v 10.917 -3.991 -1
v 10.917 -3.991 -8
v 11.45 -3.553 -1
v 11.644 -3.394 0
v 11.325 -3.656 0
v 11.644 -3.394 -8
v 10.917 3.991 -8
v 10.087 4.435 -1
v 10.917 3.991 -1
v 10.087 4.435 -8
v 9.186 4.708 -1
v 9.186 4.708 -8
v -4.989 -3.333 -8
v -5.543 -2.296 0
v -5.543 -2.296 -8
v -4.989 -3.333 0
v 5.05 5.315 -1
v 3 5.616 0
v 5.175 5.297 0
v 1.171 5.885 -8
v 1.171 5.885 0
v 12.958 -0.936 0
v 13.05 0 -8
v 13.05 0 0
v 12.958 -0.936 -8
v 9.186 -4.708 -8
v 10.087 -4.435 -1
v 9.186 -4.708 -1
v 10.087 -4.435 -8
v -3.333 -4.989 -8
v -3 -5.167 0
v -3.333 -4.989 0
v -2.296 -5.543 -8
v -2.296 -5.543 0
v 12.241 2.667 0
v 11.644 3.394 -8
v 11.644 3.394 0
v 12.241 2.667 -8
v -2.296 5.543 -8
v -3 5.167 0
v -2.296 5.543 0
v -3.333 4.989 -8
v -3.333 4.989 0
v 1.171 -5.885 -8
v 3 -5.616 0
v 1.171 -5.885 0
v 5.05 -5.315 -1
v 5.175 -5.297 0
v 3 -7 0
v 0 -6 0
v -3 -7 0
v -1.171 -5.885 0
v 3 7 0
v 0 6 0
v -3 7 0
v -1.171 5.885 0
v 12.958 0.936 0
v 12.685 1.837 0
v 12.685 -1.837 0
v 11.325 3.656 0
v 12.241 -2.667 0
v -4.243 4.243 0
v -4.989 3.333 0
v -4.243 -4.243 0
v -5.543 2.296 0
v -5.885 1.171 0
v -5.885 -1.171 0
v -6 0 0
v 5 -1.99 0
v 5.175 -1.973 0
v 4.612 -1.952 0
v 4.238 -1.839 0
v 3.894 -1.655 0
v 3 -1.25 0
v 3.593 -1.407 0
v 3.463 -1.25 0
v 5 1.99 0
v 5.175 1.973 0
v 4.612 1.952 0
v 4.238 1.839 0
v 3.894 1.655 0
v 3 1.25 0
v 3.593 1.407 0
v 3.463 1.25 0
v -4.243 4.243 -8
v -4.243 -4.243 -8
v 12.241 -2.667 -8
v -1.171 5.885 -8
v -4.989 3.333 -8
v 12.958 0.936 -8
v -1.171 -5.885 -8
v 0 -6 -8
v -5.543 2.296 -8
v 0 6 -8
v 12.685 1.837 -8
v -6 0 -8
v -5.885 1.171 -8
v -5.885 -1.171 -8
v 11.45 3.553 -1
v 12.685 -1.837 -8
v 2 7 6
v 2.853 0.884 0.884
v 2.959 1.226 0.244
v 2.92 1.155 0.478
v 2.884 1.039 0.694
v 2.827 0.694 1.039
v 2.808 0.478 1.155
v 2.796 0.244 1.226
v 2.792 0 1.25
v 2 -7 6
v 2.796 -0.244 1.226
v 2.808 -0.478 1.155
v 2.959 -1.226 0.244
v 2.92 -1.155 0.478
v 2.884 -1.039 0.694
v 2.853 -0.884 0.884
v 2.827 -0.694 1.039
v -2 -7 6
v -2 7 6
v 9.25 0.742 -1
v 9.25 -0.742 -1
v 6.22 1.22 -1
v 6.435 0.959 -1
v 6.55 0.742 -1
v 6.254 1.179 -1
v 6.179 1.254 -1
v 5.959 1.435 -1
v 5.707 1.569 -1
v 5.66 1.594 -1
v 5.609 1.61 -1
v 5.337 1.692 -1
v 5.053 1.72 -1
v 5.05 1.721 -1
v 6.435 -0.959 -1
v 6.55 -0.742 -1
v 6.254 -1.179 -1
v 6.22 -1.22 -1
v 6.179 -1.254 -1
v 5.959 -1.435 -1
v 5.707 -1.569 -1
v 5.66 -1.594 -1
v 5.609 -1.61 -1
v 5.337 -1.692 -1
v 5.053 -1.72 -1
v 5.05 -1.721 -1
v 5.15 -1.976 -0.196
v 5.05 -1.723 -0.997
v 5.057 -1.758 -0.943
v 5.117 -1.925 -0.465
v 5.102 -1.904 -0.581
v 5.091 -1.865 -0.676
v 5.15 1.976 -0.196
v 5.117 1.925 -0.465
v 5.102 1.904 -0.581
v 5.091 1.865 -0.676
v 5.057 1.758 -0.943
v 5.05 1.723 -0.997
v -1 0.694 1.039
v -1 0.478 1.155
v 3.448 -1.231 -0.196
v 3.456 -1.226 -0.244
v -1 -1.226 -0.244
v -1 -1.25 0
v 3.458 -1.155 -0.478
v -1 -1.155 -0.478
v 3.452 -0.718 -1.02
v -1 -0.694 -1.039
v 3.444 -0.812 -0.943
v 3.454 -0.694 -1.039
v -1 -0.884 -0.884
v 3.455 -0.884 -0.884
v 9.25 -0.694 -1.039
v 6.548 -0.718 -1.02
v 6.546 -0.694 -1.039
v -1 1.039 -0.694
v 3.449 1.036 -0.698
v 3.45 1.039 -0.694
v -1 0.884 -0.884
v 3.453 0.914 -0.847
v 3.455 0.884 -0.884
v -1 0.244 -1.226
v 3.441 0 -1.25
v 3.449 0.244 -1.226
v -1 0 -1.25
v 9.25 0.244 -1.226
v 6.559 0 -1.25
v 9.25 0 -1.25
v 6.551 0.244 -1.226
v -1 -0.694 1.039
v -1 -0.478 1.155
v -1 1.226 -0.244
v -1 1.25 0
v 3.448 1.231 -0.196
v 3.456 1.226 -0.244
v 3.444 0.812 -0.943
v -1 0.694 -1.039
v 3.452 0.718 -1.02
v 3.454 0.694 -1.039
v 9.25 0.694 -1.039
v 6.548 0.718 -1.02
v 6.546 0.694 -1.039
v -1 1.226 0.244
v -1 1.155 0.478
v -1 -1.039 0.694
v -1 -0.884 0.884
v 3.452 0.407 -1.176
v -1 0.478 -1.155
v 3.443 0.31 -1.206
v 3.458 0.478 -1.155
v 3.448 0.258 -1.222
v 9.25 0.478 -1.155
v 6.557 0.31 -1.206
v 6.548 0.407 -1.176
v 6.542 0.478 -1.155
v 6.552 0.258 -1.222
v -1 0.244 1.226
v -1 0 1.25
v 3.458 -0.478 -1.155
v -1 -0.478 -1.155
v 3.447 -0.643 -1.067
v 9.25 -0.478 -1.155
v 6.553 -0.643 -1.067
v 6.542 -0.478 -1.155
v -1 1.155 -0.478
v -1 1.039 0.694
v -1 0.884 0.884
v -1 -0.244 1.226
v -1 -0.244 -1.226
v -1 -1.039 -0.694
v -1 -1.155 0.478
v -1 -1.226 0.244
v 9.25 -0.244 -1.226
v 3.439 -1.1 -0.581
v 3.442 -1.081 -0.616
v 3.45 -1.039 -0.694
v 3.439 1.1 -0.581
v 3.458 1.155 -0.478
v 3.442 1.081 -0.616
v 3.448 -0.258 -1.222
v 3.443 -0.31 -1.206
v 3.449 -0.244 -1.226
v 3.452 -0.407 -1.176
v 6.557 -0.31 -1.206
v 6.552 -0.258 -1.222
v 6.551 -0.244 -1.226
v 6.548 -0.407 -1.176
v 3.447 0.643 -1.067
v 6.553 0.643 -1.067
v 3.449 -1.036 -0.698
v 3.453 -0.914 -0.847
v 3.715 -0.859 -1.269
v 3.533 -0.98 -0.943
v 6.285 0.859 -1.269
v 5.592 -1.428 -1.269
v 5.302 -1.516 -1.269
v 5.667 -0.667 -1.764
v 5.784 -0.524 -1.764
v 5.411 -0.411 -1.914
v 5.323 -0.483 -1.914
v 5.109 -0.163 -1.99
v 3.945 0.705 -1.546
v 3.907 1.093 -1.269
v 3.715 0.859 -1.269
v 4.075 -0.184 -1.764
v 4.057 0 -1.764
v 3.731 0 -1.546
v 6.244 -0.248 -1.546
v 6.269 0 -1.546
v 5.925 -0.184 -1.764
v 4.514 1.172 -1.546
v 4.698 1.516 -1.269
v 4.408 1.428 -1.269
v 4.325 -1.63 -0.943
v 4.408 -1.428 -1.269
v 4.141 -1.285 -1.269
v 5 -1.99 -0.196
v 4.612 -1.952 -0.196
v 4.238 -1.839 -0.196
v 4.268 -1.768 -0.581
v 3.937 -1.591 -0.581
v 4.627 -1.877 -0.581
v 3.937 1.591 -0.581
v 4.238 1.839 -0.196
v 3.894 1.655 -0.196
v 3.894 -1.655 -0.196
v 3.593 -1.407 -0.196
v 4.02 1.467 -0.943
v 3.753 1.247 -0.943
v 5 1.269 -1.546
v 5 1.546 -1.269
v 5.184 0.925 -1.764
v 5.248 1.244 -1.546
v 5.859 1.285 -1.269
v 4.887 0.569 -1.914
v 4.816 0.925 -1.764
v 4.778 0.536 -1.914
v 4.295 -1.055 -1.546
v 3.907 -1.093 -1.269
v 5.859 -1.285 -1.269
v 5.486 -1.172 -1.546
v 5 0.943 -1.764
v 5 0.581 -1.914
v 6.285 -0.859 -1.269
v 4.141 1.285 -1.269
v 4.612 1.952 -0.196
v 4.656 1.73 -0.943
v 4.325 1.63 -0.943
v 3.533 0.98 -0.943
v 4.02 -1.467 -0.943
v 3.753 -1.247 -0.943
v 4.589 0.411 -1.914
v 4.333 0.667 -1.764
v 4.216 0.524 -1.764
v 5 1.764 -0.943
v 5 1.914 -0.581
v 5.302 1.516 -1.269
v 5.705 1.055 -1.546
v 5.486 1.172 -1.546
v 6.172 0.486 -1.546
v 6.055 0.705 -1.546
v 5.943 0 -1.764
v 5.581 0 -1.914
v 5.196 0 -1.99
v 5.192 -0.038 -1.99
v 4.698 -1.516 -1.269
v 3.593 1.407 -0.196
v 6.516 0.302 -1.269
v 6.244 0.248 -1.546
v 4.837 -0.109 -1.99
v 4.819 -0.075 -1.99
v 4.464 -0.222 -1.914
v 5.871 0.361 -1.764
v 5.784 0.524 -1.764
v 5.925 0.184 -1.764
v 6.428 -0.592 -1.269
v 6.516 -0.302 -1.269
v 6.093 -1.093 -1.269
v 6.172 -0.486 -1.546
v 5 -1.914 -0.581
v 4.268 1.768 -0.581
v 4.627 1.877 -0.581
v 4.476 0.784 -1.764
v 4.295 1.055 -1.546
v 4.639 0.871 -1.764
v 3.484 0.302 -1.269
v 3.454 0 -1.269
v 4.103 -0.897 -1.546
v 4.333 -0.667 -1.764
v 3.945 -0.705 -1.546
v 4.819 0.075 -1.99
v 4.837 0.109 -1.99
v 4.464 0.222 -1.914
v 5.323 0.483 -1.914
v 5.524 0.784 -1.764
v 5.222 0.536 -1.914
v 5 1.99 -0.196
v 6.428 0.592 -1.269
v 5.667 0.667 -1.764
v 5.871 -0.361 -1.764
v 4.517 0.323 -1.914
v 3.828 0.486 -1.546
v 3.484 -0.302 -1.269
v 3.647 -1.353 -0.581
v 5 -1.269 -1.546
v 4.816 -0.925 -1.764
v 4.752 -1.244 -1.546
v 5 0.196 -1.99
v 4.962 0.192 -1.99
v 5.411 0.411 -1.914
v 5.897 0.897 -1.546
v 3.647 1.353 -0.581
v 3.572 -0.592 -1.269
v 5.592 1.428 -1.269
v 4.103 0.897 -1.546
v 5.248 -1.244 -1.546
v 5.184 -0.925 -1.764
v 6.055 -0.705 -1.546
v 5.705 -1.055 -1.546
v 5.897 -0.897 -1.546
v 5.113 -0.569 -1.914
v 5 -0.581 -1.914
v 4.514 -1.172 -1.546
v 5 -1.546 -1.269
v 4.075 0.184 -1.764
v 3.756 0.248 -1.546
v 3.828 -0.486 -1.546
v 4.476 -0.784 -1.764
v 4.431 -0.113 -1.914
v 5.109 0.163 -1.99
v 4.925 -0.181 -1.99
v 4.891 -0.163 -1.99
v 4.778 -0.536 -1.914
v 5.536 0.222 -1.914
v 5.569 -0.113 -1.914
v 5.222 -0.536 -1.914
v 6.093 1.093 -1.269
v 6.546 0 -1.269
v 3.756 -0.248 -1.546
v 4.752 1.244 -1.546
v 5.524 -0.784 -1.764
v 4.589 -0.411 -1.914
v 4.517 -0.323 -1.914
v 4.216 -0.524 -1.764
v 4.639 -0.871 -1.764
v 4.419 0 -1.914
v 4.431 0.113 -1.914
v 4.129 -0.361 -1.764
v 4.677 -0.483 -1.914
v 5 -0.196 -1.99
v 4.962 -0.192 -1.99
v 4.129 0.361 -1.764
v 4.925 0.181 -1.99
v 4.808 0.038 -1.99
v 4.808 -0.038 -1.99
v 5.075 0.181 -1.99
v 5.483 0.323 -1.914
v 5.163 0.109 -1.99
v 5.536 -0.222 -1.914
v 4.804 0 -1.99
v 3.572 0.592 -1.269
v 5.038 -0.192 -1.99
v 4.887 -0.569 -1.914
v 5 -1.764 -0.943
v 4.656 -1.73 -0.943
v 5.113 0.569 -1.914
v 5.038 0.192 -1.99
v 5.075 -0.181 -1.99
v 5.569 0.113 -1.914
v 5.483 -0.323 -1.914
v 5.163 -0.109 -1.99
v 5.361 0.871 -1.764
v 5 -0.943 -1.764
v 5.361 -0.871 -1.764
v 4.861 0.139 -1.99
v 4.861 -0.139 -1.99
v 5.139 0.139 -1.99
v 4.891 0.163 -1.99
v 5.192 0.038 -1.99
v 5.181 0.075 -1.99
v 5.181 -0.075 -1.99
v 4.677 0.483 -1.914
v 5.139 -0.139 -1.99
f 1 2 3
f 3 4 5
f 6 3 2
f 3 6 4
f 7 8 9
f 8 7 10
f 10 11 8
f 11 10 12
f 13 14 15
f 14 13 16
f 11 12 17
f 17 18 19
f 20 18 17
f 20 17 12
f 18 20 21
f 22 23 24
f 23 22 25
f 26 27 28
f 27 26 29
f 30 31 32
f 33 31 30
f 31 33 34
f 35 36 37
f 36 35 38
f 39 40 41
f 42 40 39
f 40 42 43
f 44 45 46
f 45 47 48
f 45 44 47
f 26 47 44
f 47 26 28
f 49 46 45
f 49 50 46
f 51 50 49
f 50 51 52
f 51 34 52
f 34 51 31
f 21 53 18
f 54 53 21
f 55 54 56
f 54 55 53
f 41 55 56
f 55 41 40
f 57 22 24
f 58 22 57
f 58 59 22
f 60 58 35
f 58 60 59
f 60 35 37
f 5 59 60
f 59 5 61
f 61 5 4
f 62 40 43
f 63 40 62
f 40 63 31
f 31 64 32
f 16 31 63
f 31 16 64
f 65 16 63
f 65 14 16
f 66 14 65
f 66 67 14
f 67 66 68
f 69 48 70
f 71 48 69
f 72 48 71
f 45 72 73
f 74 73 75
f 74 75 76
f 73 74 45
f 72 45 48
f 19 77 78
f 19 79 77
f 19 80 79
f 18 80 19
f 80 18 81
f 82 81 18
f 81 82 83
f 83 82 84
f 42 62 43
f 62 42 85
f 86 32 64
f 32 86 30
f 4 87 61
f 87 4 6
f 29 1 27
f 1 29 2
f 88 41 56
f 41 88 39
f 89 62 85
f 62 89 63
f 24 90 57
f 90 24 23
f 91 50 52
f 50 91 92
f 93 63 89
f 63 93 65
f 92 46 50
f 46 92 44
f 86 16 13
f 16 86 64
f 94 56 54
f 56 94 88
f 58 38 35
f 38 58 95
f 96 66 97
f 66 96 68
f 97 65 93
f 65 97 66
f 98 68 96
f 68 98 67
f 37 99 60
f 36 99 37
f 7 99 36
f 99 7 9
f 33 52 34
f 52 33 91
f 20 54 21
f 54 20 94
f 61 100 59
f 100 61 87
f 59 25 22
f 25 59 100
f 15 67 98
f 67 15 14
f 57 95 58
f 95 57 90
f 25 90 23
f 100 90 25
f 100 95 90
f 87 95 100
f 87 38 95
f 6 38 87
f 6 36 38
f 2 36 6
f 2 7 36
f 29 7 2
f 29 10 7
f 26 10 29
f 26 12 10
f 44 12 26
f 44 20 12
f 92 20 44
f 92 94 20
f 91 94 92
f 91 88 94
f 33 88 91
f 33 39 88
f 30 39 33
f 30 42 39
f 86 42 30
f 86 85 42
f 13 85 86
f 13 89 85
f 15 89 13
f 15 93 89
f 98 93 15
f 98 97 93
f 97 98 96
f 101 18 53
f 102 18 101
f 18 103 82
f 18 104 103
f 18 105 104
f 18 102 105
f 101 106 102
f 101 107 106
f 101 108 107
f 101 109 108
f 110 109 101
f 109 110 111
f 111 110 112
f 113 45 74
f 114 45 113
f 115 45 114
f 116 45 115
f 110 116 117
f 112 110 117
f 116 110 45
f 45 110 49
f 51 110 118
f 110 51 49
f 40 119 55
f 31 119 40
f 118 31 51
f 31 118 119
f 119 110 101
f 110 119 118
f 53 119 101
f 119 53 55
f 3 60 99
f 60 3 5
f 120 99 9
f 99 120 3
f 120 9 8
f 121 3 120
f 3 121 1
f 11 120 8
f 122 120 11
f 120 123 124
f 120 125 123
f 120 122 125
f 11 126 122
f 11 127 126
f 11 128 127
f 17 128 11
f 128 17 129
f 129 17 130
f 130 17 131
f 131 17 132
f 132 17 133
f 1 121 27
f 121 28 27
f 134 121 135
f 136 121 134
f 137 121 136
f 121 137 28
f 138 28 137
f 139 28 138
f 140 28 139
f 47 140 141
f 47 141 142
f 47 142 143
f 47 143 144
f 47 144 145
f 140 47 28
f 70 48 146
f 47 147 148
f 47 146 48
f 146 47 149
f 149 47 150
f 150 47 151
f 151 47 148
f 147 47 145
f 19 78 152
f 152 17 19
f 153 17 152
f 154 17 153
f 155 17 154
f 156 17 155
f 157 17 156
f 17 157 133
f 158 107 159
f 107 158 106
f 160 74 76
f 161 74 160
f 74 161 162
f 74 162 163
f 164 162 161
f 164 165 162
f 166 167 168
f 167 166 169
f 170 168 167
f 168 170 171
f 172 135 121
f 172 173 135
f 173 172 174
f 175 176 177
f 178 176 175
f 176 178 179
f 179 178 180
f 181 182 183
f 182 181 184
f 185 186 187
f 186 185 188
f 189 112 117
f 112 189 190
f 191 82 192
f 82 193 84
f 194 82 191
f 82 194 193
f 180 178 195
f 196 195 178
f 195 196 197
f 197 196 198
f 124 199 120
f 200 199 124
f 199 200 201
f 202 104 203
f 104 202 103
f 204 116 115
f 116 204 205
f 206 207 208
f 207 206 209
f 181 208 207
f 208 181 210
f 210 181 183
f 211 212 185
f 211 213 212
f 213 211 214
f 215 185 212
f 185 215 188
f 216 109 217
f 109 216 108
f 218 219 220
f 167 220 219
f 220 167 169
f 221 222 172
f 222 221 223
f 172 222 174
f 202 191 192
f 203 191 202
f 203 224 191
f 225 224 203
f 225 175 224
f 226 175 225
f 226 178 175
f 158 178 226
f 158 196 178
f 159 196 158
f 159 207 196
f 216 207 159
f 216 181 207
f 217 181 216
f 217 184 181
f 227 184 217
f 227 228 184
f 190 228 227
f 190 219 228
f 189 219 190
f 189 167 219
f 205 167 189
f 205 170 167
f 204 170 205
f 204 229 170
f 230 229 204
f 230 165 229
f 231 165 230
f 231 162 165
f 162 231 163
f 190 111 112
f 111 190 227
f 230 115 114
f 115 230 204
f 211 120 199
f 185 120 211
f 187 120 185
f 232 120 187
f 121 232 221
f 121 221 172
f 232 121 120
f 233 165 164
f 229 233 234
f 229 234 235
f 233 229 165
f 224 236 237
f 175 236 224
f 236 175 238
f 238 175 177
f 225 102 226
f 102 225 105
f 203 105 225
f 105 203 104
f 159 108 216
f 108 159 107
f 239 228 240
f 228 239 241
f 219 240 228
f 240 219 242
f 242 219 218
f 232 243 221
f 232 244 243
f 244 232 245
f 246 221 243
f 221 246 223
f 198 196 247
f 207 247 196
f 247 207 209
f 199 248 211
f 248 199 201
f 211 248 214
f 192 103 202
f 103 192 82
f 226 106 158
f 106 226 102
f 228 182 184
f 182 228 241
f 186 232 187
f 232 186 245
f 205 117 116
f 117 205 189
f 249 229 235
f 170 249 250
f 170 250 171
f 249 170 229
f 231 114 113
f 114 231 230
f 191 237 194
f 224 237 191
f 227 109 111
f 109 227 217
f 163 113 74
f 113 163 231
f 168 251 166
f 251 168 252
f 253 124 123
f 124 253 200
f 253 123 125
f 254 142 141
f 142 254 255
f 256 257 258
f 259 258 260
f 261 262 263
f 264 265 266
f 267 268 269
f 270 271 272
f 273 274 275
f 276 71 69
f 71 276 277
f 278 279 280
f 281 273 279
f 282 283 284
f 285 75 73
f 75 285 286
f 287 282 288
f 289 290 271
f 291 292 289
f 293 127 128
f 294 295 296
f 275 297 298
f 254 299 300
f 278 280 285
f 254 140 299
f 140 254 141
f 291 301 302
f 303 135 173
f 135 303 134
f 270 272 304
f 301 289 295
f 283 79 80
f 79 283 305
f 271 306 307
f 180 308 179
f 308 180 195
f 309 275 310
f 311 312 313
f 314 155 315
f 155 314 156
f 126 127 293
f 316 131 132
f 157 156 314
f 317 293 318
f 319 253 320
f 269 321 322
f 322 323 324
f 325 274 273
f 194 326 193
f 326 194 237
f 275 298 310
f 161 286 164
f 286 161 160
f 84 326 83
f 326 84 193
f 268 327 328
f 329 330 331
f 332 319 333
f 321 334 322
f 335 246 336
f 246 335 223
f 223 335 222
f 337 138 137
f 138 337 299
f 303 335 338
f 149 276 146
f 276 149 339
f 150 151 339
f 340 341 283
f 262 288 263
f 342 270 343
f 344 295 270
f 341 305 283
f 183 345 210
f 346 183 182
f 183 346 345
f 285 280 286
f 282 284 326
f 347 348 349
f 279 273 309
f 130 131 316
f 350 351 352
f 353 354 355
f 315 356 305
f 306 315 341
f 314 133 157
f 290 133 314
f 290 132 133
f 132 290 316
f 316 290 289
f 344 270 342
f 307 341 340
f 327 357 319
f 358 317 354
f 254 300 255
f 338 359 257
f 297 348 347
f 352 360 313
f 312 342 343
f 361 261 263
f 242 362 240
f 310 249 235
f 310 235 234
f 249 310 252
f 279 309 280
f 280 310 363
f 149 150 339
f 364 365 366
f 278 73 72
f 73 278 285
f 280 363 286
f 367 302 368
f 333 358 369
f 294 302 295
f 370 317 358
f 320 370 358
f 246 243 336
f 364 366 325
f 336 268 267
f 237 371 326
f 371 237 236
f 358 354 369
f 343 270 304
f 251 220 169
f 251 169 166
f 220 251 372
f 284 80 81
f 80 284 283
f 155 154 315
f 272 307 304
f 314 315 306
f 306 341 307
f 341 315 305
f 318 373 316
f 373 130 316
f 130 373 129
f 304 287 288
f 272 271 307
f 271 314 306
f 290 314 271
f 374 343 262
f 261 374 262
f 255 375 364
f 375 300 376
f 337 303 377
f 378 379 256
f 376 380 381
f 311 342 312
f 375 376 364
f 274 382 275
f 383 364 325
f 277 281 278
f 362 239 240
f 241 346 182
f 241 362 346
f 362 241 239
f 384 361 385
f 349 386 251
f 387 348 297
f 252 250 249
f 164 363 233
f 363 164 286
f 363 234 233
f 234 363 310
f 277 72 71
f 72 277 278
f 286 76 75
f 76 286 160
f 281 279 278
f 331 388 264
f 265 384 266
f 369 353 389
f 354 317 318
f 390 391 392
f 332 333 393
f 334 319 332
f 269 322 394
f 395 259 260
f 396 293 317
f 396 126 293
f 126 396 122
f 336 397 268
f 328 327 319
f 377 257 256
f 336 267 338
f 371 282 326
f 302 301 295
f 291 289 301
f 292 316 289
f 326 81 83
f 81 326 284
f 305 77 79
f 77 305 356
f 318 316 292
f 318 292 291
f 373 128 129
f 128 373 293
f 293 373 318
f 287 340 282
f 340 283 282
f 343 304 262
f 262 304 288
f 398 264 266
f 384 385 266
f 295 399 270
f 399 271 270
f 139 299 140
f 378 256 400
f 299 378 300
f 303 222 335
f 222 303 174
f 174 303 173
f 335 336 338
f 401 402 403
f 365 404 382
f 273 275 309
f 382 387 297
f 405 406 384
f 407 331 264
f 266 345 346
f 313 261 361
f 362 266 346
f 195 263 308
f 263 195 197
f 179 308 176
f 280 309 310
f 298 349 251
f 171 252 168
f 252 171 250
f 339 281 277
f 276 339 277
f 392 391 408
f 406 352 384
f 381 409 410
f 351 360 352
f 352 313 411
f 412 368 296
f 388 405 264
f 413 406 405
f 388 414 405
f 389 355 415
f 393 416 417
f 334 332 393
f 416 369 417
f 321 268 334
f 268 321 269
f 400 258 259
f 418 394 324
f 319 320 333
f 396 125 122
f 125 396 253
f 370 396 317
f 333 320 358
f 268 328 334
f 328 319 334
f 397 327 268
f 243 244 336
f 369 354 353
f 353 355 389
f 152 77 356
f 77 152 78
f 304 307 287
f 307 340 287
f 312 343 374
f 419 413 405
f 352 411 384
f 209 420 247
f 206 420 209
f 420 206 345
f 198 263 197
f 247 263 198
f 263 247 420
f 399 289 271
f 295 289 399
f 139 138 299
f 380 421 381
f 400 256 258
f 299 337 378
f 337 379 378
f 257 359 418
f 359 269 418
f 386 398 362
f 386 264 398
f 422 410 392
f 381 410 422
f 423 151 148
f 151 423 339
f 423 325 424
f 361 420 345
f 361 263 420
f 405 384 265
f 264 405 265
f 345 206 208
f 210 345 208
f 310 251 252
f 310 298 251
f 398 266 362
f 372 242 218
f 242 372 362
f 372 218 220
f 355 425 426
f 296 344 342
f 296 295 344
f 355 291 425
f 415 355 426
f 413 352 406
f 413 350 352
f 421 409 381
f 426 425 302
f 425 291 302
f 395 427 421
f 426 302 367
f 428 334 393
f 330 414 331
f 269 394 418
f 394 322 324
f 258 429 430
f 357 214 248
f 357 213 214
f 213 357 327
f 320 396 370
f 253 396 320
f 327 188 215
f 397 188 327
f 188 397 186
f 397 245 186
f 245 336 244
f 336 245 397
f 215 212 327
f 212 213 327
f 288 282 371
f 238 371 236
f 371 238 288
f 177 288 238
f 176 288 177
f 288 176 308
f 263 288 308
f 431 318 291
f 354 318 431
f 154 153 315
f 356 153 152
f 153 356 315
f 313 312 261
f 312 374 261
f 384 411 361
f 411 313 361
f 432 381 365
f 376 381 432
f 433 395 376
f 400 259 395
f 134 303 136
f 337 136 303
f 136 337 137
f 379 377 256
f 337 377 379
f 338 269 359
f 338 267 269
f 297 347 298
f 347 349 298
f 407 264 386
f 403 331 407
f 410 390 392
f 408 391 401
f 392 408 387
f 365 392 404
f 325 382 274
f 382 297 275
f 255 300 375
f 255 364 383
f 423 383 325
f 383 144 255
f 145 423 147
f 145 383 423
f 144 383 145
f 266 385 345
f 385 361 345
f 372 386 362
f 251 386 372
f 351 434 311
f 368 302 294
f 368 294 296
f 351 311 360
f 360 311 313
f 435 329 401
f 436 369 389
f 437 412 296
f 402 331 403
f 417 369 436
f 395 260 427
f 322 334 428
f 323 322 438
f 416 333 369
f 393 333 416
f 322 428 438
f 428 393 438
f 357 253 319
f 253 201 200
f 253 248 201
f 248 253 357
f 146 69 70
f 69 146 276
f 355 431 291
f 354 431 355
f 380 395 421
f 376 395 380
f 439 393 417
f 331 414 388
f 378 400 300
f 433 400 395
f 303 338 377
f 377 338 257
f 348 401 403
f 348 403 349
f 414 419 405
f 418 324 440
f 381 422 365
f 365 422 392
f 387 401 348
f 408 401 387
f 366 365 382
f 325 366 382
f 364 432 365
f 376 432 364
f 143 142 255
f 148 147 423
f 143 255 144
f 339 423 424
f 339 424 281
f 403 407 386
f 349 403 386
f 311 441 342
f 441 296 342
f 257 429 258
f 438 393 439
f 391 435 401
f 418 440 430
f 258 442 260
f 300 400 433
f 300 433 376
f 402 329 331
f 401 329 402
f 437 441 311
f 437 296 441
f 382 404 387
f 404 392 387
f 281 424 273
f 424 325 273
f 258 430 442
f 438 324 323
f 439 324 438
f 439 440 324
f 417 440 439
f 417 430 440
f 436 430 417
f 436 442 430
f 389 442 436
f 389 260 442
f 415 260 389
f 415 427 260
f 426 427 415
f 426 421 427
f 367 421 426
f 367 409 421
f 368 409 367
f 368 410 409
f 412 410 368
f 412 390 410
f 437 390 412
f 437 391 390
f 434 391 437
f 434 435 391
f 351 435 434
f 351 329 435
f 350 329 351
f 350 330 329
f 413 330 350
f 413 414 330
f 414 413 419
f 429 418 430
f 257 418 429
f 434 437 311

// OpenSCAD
// COBRA-Snap Finger Segment - proximal
// Dovetail slide joints, no glue needed

$fn = 32;

module finger_segment() {
    difference() {
        union() {
            // Main body
            hull() {
                translate([0, 0, -4])
                cylinder(h=8, d=12, center=true);
                
                translate([8.25, 0, -4])
                cylinder(h=8, d=9.600000000000001, center=true);
            }
            
            // Male dovetail (proximal end)
            translate([0, 0, 0])
            rotate([90, 0, 0])
            linear_extrude(height=14, center=true)
            polygon(points=[[-3, 0], [3, 0], [2, 6], [-2, 6]]);
        }
        
        // Female dovetail socket (distal end) - skip for distal
        
        translate([8.25, 0, 0])
        rotate([90, 0, 0])
        linear_extrude(height=11.600000000000001, center=true)
        polygon(points=[[-3.2, -1], [3.2, -1], [2.2, 7], [-2.2, 7]]);
        
        
        // Tendon channel
        translate([4.125, 0, 0])
        rotate([0, 90, 0])
        cylinder(h=10.25, d=2.5, center=true);
        
        // Quick-connect socket for tendon
        translate([5, 0, 0])
        sphere(d=4);
    }
}

finger_segment();
